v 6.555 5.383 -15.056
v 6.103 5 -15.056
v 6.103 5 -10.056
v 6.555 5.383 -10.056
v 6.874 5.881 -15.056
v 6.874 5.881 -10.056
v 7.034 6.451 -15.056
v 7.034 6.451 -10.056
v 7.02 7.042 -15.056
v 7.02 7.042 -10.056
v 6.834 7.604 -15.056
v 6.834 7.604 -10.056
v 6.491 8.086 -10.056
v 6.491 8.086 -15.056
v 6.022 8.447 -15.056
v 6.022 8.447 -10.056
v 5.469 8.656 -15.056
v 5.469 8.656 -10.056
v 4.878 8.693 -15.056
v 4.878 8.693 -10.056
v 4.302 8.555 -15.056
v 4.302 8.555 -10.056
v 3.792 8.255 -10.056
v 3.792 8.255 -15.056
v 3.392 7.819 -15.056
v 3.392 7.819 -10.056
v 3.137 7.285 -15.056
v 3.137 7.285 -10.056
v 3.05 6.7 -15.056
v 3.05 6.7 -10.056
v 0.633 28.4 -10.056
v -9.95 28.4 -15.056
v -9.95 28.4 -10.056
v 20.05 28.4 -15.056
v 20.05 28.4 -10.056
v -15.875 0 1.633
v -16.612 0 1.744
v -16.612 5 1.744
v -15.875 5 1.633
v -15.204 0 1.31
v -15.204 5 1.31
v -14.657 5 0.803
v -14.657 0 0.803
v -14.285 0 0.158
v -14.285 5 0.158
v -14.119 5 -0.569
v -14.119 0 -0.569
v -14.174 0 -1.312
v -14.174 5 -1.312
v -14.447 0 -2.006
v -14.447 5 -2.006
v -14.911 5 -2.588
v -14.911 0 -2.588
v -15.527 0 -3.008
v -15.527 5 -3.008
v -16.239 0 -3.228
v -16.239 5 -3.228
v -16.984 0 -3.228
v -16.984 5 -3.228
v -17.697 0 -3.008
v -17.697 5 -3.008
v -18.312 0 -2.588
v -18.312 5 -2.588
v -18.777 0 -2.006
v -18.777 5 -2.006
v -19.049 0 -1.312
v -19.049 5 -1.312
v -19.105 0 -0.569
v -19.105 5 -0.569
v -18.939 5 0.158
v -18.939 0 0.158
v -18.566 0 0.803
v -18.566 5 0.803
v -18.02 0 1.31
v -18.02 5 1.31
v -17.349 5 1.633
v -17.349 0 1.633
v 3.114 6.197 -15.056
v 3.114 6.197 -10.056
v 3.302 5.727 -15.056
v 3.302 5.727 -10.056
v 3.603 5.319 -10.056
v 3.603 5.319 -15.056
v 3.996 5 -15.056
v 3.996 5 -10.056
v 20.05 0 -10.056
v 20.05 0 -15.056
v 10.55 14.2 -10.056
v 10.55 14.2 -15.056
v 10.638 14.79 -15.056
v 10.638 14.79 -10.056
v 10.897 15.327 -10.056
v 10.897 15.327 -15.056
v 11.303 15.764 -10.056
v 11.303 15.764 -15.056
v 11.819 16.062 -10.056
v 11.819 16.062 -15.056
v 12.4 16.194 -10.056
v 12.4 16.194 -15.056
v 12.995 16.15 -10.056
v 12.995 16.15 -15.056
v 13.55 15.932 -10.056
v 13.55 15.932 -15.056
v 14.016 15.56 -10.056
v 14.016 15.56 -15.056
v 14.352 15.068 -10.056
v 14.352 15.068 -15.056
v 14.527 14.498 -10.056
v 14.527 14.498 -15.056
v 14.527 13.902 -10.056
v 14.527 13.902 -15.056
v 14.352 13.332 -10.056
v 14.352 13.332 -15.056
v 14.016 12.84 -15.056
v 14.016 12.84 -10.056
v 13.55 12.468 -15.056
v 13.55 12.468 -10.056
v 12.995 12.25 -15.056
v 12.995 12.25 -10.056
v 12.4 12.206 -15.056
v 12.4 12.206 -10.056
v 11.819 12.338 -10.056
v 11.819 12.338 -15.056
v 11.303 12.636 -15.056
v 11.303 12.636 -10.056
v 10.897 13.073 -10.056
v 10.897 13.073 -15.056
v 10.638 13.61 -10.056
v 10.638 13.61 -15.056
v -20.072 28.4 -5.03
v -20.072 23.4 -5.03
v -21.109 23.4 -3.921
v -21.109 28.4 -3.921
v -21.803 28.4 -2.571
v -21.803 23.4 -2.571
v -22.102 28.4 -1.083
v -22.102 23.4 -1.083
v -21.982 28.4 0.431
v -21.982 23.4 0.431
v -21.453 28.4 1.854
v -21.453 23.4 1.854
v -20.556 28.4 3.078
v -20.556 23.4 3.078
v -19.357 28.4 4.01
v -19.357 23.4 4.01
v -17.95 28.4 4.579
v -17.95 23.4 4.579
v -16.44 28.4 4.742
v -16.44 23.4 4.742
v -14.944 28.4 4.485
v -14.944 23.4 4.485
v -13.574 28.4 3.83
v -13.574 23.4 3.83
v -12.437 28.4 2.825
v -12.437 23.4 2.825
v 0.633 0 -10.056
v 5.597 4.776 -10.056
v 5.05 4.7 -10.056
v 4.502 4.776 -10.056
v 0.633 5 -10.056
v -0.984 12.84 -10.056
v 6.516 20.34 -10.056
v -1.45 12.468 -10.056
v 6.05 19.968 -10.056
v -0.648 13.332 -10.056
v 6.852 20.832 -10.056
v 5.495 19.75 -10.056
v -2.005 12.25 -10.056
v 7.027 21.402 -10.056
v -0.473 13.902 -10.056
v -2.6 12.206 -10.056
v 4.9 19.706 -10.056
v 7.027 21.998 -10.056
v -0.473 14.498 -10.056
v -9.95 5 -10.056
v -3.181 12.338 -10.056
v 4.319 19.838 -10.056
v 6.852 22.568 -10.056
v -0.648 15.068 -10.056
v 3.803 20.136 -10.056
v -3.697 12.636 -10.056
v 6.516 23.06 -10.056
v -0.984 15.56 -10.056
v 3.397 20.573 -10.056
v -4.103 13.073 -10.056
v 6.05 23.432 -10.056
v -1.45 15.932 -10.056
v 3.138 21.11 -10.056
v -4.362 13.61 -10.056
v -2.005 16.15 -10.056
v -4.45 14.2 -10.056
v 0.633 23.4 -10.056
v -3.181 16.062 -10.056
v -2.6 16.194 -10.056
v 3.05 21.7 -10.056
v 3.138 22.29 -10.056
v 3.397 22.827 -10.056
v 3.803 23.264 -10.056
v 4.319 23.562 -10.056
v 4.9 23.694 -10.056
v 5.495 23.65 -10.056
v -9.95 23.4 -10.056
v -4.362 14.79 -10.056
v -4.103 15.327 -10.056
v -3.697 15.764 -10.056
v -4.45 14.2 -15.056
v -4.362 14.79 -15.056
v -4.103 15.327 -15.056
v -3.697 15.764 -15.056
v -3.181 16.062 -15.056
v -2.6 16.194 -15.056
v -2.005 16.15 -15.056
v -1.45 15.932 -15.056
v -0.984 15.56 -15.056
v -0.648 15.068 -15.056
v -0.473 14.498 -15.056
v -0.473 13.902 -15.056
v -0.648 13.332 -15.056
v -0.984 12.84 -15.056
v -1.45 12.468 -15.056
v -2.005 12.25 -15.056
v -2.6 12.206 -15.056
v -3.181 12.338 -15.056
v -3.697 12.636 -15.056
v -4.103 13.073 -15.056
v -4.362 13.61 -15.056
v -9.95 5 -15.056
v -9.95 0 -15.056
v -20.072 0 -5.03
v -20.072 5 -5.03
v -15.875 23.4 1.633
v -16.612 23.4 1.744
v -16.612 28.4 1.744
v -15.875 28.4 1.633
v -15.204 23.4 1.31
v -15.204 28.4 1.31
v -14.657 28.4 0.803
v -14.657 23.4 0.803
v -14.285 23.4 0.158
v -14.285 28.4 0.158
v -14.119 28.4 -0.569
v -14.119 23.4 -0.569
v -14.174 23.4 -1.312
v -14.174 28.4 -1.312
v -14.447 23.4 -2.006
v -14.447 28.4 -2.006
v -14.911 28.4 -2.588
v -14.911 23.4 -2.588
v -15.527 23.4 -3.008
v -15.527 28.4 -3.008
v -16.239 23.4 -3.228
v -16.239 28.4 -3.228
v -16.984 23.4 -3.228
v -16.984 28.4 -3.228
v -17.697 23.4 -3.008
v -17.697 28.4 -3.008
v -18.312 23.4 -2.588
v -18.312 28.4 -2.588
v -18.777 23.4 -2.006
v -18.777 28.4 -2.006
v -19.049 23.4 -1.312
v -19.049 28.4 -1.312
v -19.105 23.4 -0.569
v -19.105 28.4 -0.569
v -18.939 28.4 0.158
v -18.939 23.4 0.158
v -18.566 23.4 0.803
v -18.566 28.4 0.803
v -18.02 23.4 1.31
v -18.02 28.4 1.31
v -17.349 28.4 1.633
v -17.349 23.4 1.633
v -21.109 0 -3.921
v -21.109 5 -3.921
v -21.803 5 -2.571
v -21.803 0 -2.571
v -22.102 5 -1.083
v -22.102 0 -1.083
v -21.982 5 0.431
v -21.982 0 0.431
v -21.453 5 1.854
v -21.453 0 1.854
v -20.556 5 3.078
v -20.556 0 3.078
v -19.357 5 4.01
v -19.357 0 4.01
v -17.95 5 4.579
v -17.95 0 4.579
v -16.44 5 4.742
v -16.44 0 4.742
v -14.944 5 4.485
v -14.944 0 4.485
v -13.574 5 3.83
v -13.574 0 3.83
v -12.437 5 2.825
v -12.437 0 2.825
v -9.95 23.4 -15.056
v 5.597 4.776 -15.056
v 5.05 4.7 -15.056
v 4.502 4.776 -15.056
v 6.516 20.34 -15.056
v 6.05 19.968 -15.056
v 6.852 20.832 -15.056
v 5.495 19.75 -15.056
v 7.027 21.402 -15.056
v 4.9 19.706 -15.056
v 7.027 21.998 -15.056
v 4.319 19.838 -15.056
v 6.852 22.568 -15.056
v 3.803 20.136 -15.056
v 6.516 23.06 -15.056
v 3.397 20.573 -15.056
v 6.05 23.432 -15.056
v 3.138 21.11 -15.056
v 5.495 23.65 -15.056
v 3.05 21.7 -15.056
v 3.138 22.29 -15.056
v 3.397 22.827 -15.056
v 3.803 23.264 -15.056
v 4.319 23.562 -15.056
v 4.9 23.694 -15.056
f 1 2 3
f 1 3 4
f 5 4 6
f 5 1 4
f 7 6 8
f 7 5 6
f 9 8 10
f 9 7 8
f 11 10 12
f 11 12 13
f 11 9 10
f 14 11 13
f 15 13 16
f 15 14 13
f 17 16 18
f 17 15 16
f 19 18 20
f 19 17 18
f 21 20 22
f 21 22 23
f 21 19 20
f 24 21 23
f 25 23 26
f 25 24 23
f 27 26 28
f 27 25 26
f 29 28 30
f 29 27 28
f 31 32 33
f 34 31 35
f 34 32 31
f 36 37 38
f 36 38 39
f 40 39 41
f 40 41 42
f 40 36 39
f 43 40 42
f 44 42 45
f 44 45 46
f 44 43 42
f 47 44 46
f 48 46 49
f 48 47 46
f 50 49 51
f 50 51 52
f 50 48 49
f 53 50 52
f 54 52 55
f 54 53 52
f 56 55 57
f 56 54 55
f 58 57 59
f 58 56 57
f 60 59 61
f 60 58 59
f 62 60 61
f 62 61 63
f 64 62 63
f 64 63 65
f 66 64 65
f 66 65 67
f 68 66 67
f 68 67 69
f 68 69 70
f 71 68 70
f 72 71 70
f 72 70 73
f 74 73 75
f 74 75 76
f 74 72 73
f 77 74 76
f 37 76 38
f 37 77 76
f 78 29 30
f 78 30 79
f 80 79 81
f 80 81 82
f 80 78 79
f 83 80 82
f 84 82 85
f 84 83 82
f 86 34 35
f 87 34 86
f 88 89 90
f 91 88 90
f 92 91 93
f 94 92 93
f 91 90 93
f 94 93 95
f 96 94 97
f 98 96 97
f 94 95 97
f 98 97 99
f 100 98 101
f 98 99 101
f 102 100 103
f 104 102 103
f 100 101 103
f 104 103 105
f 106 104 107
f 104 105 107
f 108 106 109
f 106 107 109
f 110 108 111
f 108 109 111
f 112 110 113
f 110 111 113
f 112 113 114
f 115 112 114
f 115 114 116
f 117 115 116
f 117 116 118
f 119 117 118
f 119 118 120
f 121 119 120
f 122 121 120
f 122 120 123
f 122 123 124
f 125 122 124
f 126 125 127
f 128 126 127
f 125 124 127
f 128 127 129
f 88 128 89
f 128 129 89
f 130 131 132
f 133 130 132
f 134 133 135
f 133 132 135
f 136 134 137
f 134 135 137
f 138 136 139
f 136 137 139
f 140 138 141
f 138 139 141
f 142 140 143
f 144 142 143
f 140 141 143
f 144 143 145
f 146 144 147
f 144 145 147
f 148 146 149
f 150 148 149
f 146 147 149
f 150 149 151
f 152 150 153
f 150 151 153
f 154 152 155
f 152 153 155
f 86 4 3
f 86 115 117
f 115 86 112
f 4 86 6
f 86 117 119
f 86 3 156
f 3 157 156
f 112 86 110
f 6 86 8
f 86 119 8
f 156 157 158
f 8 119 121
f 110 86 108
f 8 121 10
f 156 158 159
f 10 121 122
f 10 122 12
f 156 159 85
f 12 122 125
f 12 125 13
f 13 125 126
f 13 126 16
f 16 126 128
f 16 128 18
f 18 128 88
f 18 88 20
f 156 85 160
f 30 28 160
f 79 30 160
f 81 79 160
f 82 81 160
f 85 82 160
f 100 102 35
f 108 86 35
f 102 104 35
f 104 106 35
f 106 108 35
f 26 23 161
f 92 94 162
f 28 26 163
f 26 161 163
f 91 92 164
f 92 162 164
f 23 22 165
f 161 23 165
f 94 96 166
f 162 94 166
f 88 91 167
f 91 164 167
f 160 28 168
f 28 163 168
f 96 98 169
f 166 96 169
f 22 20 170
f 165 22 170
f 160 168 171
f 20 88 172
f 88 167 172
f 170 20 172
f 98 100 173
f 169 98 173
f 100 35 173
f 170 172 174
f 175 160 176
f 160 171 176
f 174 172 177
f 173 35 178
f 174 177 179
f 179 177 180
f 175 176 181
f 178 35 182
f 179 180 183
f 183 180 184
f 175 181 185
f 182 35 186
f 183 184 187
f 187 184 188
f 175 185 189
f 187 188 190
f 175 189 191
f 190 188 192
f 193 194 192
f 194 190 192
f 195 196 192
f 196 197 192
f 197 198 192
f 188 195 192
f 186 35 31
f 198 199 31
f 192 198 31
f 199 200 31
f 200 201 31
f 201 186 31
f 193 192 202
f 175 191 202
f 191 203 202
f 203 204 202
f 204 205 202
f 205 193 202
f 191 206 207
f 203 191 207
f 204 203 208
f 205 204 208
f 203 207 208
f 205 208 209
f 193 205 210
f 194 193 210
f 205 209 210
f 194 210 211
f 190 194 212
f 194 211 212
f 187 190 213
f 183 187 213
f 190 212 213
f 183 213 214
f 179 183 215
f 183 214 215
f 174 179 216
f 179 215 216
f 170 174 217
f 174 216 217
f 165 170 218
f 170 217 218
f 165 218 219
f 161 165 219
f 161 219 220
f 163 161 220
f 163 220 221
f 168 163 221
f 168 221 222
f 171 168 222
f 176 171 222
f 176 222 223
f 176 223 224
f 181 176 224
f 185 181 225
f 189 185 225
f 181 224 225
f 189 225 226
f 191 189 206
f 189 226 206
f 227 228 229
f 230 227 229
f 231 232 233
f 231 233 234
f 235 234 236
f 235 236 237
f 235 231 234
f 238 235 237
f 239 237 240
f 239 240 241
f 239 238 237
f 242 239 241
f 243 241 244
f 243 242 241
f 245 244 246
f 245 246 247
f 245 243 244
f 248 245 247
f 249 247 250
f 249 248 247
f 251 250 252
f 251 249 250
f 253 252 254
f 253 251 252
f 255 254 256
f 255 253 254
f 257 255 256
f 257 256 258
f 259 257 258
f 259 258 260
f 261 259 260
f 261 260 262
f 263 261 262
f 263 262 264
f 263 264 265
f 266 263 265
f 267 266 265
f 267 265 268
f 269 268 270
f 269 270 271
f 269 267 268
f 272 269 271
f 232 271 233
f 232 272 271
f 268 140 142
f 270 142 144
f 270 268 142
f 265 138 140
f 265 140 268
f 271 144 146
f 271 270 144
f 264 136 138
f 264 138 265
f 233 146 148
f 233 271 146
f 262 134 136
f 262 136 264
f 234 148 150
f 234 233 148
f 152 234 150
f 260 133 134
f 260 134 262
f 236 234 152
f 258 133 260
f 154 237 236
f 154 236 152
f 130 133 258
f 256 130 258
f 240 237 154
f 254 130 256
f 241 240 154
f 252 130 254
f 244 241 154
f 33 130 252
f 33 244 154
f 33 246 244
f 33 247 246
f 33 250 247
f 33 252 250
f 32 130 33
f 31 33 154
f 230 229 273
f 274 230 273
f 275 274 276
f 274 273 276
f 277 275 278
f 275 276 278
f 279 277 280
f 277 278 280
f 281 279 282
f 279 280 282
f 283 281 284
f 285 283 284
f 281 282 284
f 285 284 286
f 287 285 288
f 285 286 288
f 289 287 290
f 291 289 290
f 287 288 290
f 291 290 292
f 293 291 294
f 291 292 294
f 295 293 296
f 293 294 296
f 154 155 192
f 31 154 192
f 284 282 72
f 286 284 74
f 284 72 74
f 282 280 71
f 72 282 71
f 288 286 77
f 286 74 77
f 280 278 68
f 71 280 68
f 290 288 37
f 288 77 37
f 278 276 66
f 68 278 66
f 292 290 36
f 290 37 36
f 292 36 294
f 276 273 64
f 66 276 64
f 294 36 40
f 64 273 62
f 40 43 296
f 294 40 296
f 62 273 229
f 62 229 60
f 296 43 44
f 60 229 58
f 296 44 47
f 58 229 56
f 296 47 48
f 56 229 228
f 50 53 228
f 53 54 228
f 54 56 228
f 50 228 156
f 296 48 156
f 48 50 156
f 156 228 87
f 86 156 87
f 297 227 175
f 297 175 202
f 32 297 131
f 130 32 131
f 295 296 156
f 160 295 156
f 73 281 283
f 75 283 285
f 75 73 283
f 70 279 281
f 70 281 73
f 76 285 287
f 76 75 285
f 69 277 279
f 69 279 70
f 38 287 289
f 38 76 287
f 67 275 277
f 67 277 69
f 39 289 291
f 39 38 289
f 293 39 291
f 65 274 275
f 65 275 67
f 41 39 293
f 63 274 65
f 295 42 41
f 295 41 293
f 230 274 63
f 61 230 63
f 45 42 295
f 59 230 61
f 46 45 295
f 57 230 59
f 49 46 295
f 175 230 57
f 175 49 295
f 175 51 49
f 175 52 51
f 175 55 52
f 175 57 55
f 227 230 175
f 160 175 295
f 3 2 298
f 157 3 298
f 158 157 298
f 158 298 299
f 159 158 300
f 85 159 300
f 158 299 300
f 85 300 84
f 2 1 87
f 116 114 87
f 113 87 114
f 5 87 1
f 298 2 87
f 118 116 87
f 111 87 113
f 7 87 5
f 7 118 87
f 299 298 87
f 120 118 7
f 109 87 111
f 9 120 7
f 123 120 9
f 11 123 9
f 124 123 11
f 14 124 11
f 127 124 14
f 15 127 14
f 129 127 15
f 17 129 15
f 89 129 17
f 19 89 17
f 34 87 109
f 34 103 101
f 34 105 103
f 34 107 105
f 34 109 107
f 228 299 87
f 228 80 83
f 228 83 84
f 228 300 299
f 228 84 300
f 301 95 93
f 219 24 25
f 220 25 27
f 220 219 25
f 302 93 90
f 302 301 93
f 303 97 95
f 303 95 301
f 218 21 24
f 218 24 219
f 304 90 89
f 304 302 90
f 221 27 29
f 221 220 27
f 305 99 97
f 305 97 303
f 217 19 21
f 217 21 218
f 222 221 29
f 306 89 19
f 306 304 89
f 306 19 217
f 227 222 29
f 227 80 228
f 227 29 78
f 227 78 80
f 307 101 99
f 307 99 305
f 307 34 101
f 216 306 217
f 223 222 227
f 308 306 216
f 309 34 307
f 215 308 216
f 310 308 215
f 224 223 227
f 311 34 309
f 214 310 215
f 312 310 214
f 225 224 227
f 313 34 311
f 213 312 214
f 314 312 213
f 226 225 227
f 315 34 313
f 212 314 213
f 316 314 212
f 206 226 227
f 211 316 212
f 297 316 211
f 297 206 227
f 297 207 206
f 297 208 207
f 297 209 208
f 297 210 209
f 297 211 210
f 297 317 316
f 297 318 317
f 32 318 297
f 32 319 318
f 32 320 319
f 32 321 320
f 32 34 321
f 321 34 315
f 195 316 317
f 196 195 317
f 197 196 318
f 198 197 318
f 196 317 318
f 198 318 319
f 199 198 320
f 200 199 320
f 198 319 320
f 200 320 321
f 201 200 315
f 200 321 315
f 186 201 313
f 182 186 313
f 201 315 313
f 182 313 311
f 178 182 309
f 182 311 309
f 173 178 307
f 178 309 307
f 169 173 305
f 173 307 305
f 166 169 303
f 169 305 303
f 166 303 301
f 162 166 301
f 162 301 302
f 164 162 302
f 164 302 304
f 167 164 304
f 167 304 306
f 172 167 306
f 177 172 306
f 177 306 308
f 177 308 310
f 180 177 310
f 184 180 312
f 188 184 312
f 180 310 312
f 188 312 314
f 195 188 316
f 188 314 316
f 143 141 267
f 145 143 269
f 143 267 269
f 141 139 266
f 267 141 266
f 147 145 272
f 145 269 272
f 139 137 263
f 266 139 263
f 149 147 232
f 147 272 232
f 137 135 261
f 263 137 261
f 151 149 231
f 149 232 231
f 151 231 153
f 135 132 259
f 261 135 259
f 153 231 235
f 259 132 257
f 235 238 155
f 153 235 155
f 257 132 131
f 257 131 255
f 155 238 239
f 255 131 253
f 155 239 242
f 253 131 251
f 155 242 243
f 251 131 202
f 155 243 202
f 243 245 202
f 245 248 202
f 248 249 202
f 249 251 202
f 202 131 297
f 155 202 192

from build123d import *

# Parameters (mm, degrees)
SKETCH1_R           = 2.5
BOSS_EXTRUDE1_DEPTH = 5
SKETCH2_R           = 2
BOSS_EXTRUDE2_DEPTH = 5
CUT_EXTRUDE1_DEPTH  = 42.079586535
BOSS_EXTRUDE3_START = -5
SKETCH3_R           = 2.5
BOSS_EXTRUDE3_DEPTH = 5


with BuildPart() as part:
    # Sketch1 → Boss-Extrude1 (new body)
    with BuildSketch(Plane(origin=(0, 0, 0), x_dir=(1, 0, 0), z_dir=(0, 1, 0))):
        with BuildLine():
            Line((20.049610011, 15.055516278), (-9.950389989, 15.055516278))
            Line((-9.950389989, 15.055516278), (-20.072425289, 5.030348084))
            ThreePointArc((-20.072425289, 5.030348084), (-20.555517893, -3.078179001), (-12.436571265, -2.824613195))
            Line((-12.436571265, -2.824613195), (0.632983681, 10.055516278))
            Line((0.632983681, 10.055516278), (20.049610011, 10.055516278))
            Line((20.049610011, 10.055516278), (20.049610011, 15.055516278))
        make_face()
        with Locations((-16.611816522, 0.755516278)):
            Circle(SKETCH1_R, mode=Mode.SUBTRACT)
    extrude(amount=BOSS_EXTRUDE1_DEPTH)

    # Sketch2 → Boss-Extrude2 (add)
    with BuildSketch(Plane(origin=(0, 0, -15.055516278), x_dir=(-1, 0, 0), z_dir=(0, 0, -1))):
        with BuildLine():
            Line((9.950389989, 5), (9.950389989, 23.4))
            Line((9.950389989, 23.4), (9.950389989, 28.4))
            Line((9.950389989, 28.4), (-20.049610011, 28.4))
            Line((-20.049610011, 28.4), (-20.049610011, 5))
            Line((-20.049610011, 5), (-6.103175386, 5))
            ThreePointArc((-6.103175386, 5), (-6.022458727, 8.447445385), (-3.049610011, 6.7))
            ThreePointArc((-3.049610011, 6.7), (-3.302164625, 5.727151284), (-3.996044635, 5))
            Line((-3.996044635, 5), (9.950389989, 5))
        make_face()
        with Locations((-12.549610011, 14.2)):
            Circle(SKETCH2_R, mode=Mode.SUBTRACT)
        with Locations((-5.049610011, 21.7)):
            Circle(SKETCH2_R, mode=Mode.SUBTRACT)
        with Locations((2.450389989, 14.2)):
            Circle(SKETCH2_R, mode=Mode.SUBTRACT)
    extrude(amount=-BOSS_EXTRUDE2_DEPTH)

    # Sketch2<3> → Cut-Extrude1 (cut, through all)
    with BuildSketch(Plane(origin=(0, 0, -15.055516278), x_dir=(-1, 0, 0), z_dir=(0, 0, -1))):
        with BuildLine():
            ThreePointArc((-6.103175386, 5), (-5.049610011, 4.7), (-3.996044635, 5))
            Line((-3.996044635, 5), (-6.103175386, 5))
        make_face()
    extrude(amount=-CUT_EXTRUDE1_DEPTH, mode=Mode.SUBTRACT)

    # Sketch3 → Boss-Extrude3 (add)
    with BuildSketch(Plane(origin=(0, 28.4, 0), x_dir=(1, 0, 0), z_dir=(0, 1, 0)).offset(BOSS_EXTRUDE3_START)):
        with BuildLine():
            Line((-9.950389989, 10.055516278), (-9.950389989, 15.055516278))
            Line((-9.950389989, 15.055516278), (-20.072425289, 5.030348084))
            ThreePointArc((-20.072425289, 5.030348084), (-20.555517893, -3.078179001), (-12.436571265, -2.824613195))
            Line((-12.436571265, -2.824613195), (0.632983681, 10.055516278))
            Line((0.632983681, 10.055516278), (-9.950389989, 10.055516278))
        make_face()
        with Locations((-16.611816522, 0.755516278)):
            Circle(SKETCH3_R, mode=Mode.SUBTRACT)
    extrude(amount=BOSS_EXTRUDE3_DEPTH)


solid = part.part
